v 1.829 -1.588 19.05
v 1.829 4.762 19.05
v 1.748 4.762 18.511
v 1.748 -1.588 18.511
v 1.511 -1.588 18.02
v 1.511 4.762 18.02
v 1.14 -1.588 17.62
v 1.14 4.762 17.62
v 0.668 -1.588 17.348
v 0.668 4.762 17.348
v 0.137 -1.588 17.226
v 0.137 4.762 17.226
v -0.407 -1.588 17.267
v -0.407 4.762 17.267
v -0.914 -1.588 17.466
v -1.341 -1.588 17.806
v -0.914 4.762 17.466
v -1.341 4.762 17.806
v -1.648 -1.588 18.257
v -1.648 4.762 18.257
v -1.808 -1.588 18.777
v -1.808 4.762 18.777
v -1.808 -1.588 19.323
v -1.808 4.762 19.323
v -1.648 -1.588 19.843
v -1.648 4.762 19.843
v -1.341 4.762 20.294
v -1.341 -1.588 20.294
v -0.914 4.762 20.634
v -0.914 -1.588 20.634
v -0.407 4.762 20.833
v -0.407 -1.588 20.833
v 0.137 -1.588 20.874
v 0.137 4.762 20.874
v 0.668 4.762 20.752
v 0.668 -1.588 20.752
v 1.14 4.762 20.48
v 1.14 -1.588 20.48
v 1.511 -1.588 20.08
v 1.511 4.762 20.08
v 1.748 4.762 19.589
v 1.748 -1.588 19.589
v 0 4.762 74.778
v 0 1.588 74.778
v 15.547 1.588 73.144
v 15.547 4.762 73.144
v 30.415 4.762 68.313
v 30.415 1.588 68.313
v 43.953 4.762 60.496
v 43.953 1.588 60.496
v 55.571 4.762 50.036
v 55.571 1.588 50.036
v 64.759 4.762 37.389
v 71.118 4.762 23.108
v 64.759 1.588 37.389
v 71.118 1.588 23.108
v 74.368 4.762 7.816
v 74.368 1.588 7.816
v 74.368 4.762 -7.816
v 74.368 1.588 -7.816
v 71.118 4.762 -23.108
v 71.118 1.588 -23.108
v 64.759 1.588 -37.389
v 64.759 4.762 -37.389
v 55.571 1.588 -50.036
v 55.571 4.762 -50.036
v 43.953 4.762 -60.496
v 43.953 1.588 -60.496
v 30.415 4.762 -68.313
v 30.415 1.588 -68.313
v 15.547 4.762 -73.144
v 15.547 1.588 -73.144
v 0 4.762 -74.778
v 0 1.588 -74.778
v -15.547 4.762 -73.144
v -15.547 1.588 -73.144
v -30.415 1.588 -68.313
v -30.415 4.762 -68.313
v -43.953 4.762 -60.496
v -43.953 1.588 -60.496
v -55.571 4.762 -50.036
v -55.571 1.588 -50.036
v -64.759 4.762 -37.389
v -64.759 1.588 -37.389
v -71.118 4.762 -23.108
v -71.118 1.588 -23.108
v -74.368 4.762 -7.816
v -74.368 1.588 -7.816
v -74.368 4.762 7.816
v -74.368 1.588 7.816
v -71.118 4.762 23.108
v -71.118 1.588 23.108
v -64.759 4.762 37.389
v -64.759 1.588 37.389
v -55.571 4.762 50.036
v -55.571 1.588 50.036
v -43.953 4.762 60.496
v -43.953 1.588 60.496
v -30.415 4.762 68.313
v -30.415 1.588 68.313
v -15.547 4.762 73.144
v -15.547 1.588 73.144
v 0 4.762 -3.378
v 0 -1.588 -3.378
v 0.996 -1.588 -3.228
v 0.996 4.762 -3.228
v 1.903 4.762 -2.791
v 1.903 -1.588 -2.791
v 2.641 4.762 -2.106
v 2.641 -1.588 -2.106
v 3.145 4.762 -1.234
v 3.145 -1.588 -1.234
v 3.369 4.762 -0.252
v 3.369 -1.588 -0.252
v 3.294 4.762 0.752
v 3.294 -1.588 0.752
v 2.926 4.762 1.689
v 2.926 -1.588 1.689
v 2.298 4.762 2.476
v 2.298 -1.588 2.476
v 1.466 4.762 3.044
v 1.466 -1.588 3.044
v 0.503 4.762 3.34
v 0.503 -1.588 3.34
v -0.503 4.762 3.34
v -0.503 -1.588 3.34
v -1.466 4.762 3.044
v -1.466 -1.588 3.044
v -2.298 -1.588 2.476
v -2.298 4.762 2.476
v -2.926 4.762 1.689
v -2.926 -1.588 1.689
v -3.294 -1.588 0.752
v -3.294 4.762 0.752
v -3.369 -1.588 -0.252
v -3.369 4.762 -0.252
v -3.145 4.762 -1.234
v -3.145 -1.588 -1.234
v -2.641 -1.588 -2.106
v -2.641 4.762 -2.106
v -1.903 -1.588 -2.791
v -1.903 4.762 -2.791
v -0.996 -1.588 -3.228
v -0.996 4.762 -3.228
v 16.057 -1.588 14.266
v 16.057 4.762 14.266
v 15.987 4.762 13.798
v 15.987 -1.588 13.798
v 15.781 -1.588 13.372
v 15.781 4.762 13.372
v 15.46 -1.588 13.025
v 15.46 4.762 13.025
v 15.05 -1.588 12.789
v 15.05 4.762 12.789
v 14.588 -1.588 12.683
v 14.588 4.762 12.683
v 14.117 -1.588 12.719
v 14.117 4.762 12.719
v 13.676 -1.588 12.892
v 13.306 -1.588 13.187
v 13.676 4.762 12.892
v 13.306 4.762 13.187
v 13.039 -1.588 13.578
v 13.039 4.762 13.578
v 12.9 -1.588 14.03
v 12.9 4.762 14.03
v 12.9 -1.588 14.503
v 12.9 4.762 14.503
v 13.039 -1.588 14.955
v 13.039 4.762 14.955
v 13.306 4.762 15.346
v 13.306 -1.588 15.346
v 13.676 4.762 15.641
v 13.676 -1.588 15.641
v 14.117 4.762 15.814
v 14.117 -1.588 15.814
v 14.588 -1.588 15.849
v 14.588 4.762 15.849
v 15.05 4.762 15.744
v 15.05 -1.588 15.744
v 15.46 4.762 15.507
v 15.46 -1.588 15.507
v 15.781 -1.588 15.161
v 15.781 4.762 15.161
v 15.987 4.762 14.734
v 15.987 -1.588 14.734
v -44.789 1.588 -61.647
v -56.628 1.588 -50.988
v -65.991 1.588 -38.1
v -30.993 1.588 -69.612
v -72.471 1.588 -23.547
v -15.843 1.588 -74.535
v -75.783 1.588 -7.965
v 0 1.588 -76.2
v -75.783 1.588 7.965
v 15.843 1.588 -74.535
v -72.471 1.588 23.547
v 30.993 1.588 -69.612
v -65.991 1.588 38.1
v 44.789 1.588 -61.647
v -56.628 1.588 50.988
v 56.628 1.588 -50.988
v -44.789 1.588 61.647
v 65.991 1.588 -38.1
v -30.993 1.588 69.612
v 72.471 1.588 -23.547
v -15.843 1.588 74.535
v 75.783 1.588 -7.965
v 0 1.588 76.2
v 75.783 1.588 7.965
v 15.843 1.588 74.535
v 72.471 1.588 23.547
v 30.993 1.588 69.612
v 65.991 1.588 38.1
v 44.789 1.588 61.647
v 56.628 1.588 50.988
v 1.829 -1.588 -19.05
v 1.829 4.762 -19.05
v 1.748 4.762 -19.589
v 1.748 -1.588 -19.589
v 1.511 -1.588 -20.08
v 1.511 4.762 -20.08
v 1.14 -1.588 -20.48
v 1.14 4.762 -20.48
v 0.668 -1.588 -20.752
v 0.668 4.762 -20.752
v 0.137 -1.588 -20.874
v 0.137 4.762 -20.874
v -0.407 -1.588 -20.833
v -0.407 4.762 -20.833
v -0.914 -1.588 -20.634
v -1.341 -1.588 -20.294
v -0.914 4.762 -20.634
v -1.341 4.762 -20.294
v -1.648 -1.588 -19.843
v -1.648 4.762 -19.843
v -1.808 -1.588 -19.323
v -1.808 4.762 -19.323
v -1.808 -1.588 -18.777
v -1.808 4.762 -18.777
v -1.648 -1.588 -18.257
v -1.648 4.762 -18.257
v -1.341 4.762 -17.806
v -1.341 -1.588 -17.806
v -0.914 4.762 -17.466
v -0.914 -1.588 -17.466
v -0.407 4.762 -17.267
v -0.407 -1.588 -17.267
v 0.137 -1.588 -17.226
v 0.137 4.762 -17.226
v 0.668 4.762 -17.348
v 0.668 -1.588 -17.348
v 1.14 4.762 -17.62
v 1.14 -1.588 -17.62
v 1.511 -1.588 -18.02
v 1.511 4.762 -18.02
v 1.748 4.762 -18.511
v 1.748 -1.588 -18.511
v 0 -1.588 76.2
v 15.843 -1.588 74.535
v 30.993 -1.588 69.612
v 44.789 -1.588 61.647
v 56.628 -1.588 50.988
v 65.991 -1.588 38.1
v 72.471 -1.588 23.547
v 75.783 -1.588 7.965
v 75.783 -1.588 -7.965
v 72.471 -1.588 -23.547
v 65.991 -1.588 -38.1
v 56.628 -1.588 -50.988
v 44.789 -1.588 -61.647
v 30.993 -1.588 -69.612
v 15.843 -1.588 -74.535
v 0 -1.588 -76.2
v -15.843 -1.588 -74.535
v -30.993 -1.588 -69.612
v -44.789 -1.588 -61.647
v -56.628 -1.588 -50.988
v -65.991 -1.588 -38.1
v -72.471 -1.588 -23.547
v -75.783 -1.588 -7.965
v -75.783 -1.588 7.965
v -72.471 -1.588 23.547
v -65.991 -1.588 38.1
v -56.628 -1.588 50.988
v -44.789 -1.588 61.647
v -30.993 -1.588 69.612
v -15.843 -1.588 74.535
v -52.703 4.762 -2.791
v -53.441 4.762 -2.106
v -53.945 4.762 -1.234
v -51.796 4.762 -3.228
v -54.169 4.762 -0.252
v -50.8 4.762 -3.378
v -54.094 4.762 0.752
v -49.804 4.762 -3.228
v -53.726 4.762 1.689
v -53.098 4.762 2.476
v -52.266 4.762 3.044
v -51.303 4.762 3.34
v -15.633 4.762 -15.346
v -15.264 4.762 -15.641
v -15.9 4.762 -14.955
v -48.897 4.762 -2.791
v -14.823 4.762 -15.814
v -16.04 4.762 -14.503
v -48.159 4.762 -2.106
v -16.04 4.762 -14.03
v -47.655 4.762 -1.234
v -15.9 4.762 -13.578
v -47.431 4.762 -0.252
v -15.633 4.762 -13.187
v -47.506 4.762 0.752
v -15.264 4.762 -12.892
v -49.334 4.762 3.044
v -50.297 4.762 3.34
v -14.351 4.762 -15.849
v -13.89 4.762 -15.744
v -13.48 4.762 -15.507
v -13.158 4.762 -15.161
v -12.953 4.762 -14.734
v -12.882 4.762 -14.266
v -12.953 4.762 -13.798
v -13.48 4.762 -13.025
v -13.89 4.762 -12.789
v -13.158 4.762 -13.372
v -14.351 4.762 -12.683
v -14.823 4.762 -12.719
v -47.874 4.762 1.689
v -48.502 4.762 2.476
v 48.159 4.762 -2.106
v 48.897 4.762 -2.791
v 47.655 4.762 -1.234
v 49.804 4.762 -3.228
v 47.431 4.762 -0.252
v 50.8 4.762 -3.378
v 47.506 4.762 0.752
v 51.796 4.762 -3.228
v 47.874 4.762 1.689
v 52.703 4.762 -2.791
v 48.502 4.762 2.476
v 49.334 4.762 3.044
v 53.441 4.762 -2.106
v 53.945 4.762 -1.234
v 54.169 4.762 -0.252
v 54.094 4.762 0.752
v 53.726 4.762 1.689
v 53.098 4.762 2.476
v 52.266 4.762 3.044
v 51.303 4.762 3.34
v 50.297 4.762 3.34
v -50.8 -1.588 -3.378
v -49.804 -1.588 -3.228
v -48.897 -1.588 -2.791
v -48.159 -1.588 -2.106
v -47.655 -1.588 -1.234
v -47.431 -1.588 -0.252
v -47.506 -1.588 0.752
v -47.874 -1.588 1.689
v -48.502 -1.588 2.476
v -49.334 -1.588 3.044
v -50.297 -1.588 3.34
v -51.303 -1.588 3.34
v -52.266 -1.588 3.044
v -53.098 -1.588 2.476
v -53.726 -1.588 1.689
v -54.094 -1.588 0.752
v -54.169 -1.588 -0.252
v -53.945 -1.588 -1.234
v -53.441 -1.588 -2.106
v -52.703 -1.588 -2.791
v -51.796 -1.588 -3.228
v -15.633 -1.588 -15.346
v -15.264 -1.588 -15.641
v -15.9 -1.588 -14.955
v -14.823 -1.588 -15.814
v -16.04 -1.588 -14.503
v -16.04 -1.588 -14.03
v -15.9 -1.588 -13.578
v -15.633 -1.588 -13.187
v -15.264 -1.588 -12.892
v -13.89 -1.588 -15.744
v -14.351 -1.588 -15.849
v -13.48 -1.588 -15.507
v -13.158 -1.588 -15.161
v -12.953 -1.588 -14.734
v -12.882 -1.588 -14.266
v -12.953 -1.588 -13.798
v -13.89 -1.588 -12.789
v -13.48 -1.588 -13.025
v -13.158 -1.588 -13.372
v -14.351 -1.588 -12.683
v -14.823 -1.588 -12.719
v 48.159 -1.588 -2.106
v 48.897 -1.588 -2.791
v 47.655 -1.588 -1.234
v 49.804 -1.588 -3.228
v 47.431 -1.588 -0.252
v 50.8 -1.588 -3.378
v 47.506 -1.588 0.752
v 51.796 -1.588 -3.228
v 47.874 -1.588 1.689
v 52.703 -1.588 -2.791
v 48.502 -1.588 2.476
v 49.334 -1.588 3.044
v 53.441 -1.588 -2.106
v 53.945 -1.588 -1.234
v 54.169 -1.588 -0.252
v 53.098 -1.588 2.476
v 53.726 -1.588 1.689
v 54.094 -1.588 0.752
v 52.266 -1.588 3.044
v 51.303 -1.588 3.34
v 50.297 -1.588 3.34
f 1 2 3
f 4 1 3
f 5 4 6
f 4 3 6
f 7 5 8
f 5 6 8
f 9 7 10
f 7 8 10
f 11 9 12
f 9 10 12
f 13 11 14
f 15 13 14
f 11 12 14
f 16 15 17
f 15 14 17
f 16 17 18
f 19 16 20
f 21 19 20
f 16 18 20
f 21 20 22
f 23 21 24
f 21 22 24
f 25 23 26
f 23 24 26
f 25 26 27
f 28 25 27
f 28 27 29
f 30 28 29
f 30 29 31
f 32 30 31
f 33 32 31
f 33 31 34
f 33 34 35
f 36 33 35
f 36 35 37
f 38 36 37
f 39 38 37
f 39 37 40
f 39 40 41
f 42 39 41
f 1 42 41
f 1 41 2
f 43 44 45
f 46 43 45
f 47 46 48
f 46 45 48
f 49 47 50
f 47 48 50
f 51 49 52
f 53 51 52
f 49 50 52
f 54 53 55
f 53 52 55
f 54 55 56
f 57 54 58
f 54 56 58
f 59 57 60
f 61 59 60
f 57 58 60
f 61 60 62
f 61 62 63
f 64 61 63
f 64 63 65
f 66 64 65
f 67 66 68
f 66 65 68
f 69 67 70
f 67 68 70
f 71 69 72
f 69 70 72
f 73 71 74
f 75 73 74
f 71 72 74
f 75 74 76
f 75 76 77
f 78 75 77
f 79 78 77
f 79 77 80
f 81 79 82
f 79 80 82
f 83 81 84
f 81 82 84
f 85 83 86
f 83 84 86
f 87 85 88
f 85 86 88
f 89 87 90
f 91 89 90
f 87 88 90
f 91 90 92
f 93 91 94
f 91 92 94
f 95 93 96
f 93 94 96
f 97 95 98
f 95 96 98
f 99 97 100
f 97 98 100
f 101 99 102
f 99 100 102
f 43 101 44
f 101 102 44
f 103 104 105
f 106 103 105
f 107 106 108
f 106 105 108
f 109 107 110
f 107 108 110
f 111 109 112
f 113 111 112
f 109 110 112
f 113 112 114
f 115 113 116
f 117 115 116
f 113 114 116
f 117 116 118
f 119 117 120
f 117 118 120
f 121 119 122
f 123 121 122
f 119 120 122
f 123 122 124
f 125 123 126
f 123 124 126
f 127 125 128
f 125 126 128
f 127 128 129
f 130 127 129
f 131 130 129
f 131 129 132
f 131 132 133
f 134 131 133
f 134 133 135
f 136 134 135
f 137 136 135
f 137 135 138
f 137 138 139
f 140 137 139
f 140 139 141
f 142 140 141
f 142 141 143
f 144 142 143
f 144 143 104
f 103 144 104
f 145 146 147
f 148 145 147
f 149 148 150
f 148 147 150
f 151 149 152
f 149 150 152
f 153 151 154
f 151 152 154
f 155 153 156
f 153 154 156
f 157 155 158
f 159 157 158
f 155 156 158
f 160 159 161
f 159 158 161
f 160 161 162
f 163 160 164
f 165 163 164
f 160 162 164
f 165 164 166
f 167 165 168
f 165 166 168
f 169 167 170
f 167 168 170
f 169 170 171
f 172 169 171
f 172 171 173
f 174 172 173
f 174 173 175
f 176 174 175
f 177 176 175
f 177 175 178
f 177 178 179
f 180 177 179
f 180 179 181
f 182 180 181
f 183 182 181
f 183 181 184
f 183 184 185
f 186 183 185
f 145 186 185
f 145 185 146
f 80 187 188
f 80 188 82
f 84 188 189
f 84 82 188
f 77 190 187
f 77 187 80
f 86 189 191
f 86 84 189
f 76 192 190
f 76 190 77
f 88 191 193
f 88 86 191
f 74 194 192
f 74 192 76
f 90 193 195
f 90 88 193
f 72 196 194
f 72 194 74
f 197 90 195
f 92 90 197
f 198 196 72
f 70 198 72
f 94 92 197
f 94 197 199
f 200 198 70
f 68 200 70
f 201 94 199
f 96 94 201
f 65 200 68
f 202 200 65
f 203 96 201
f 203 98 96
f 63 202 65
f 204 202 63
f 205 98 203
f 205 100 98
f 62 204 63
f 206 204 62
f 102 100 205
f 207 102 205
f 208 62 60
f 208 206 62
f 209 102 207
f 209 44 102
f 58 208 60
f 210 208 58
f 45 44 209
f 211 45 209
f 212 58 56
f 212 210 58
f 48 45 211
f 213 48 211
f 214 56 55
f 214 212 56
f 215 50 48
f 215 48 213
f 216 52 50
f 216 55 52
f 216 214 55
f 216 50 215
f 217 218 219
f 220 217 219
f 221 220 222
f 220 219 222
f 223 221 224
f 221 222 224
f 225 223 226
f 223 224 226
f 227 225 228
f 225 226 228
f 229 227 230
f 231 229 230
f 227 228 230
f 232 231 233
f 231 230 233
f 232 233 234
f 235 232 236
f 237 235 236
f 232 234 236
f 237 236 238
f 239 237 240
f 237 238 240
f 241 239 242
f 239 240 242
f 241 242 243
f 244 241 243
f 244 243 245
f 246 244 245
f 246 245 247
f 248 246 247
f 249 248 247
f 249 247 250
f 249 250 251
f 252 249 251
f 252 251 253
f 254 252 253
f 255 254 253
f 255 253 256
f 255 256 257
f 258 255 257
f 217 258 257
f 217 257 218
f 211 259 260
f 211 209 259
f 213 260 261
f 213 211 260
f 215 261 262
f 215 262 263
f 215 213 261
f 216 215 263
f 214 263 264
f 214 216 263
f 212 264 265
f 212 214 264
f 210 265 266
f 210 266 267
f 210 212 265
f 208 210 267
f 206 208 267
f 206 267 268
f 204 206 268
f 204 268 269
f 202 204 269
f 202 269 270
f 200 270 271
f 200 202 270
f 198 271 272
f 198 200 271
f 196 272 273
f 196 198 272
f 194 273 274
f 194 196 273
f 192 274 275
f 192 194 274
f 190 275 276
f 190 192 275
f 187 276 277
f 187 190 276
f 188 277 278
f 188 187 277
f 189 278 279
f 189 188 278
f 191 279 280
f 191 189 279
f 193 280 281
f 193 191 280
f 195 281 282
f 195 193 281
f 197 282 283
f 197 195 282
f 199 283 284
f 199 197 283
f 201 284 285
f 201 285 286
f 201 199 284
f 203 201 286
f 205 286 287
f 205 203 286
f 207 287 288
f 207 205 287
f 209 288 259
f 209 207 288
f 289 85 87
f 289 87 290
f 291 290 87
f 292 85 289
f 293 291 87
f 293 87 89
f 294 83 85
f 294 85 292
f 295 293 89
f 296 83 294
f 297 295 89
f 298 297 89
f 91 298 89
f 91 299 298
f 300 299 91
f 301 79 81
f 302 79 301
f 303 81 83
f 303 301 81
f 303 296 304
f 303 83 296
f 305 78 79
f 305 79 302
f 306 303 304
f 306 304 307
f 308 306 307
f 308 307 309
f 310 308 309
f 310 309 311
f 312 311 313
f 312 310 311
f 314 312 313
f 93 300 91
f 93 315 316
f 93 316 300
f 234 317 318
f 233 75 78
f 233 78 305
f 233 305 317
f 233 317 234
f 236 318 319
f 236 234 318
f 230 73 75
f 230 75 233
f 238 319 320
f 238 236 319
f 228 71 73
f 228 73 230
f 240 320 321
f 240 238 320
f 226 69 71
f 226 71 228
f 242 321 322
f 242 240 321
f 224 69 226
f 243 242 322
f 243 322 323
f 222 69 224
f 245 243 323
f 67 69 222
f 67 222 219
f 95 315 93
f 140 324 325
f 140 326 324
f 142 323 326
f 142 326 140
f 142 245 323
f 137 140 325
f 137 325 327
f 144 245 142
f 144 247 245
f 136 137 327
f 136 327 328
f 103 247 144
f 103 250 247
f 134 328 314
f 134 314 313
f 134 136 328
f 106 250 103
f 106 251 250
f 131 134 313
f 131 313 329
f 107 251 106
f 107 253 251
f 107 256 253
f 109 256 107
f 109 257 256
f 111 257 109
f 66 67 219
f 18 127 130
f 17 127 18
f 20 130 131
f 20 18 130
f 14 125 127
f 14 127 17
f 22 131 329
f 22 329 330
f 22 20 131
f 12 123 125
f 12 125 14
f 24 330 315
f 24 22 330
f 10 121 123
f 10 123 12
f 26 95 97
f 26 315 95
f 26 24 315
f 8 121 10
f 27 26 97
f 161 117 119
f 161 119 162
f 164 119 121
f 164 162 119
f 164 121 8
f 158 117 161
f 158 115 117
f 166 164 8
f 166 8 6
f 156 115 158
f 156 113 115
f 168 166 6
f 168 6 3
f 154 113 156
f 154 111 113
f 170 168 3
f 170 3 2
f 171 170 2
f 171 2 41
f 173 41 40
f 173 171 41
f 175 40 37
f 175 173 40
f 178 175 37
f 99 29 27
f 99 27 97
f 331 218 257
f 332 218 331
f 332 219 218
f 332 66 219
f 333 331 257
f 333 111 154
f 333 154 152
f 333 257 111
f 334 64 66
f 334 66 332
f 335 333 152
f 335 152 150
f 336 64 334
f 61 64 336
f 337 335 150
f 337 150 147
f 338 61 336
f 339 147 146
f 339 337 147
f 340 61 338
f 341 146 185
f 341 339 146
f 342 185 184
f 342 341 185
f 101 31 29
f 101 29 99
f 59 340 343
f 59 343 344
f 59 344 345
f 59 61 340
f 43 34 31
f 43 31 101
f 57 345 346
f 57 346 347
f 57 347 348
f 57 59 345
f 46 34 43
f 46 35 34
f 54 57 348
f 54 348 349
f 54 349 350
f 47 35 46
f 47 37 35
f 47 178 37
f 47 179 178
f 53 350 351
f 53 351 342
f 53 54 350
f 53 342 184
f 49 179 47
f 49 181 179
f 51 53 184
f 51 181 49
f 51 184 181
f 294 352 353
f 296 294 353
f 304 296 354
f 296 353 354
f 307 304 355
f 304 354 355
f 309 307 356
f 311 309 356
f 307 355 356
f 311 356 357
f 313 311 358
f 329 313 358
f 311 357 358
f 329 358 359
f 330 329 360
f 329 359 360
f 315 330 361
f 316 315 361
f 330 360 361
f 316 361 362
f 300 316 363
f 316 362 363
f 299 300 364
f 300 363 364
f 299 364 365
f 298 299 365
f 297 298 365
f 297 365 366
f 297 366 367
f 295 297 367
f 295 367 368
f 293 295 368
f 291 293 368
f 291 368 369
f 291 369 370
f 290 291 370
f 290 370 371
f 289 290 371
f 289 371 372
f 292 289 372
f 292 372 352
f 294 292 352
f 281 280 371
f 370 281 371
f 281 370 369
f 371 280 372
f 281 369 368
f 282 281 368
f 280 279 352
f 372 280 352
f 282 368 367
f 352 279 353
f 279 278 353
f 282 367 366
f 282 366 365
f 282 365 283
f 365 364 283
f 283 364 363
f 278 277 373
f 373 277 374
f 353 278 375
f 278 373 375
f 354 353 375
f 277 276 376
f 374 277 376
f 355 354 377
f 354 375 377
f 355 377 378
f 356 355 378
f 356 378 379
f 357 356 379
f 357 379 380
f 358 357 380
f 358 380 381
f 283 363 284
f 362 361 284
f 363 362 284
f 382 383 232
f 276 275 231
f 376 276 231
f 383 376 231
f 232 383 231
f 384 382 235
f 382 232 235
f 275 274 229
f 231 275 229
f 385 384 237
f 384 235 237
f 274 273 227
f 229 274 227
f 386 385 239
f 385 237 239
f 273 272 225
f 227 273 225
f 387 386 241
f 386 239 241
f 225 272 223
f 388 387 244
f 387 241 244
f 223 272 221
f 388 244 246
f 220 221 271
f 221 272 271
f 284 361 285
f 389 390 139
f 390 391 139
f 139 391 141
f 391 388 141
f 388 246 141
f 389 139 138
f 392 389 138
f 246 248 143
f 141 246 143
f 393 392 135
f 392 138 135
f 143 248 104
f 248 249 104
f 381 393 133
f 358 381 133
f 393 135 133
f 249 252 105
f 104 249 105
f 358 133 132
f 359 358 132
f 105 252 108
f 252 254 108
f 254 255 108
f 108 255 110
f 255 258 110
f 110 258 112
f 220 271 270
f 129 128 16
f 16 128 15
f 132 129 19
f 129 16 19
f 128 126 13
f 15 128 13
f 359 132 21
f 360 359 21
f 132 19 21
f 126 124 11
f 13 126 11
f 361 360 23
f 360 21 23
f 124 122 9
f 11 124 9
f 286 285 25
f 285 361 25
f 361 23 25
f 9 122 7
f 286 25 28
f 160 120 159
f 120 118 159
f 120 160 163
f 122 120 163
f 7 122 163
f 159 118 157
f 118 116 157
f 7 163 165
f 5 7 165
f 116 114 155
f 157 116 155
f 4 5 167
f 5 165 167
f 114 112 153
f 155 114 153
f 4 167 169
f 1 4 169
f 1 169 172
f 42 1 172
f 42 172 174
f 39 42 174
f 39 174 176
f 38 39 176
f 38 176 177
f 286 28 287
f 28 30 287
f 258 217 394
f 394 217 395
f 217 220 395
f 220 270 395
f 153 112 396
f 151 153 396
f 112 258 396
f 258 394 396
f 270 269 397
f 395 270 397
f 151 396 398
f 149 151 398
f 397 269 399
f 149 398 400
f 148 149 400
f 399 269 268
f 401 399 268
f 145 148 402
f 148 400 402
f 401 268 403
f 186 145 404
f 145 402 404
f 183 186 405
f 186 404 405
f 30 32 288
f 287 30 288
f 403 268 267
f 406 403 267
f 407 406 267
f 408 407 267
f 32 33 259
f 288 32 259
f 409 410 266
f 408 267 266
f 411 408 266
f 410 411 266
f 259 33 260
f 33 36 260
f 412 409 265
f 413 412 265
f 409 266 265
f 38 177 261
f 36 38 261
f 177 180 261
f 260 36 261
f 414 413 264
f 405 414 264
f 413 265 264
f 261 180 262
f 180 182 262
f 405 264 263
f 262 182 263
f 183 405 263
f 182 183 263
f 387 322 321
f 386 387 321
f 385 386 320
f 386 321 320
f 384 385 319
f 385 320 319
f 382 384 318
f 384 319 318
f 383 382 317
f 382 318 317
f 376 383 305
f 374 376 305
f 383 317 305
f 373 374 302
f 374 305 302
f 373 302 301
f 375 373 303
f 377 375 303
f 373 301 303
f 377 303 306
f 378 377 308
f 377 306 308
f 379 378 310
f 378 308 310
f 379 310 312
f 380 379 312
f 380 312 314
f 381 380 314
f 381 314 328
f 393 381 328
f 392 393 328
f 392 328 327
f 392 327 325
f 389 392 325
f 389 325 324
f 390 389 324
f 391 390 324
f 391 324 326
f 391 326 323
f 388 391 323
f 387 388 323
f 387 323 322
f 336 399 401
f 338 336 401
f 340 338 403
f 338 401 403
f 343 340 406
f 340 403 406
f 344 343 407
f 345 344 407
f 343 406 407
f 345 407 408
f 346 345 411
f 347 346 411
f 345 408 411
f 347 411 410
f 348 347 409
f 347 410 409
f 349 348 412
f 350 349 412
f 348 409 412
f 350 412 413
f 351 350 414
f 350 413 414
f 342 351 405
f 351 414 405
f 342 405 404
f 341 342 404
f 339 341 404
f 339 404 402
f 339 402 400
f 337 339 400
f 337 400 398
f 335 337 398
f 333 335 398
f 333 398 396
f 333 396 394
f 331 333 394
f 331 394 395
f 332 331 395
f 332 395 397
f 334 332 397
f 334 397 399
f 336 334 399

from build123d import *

# Parameters (mm, degrees)
SKETCH1_R                    = 76.2
BOSS_EXTRUDE1_DEPTH          = 1.5875
SKETCH2_R                    = 74.7776
BOSS_EXTRUDE2_DEPTH          = 3.175
SKETCH3_R                    = 3.3782
CUT_EXTRUDE1_DEPTH           = 108.95
F_27_0_144_DIAMETER_HOLE1_D  = 3.6576
F_1_8_0_125_DIAMETER_HOLE1_D = 3.175


with BuildPart() as part:
    # Sketch1 → Boss-Extrude1 (new, symmetric)
    with BuildSketch(Plane(origin=(0, 0, 0), x_dir=(1, 0, 0), z_dir=(0, 1, 0))):
        with Locations(Location((0, 0, 0), (0, 0, 270))):
            Circle(SKETCH1_R)
    extrude(amount=BOSS_EXTRUDE1_DEPTH, both=True)

    # Sketch2 → Boss-Extrude2 (add)
    with BuildSketch(Plane(origin=(0, 1.5875, 0), x_dir=(1, 0, 0), z_dir=(0, 1, 0))):
        with Locations(Location((0, 0, 0), (0, 0, 270))):
            Circle(SKETCH2_R)
    extrude(amount=BOSS_EXTRUDE2_DEPTH)

    # Sketch3 → Cut-Extrude1 (cut, through all)
    with BuildSketch(Plane.XZ.offset(1.5875)):
        with Locations(Location((50.8, 0, 0), (0, 0, 270))):
            Circle(SKETCH3_R)
        with Locations(Location((-50.8, 0, 0), (0, 0, 270))):
            Circle(SKETCH3_R)
        with Locations(Location((0, 0, 0), (0, 0, 270))):
            Circle(SKETCH3_R)
    extrude(amount=-CUT_EXTRUDE1_DEPTH, mode=Mode.SUBTRACT)

    # #27 (0.144) Diameter Hole1 (through all)
    with Locations(Plane(origin=(0, -1.5875, 0), x_dir=(-1, 0, 0), z_dir=(0, -1, 0))):
        with Locations((0, 19.05), (0, -19.05)):
            Hole(F_27_0_144_DIAMETER_HOLE1_D / 2)

    # 1/8 (0.125) Diameter Hole1 (through all)
    with Locations(Plane(origin=(0, -1.5875, 0), x_dir=(-1, 0, 0), z_dir=(0, -1, 0))):
        with Locations((14.469766177, 14.266333333), (-14.469766177, -14.266333333)):
            Hole(F_1_8_0_125_DIAMETER_HOLE1_D / 2)


solid = part.part
